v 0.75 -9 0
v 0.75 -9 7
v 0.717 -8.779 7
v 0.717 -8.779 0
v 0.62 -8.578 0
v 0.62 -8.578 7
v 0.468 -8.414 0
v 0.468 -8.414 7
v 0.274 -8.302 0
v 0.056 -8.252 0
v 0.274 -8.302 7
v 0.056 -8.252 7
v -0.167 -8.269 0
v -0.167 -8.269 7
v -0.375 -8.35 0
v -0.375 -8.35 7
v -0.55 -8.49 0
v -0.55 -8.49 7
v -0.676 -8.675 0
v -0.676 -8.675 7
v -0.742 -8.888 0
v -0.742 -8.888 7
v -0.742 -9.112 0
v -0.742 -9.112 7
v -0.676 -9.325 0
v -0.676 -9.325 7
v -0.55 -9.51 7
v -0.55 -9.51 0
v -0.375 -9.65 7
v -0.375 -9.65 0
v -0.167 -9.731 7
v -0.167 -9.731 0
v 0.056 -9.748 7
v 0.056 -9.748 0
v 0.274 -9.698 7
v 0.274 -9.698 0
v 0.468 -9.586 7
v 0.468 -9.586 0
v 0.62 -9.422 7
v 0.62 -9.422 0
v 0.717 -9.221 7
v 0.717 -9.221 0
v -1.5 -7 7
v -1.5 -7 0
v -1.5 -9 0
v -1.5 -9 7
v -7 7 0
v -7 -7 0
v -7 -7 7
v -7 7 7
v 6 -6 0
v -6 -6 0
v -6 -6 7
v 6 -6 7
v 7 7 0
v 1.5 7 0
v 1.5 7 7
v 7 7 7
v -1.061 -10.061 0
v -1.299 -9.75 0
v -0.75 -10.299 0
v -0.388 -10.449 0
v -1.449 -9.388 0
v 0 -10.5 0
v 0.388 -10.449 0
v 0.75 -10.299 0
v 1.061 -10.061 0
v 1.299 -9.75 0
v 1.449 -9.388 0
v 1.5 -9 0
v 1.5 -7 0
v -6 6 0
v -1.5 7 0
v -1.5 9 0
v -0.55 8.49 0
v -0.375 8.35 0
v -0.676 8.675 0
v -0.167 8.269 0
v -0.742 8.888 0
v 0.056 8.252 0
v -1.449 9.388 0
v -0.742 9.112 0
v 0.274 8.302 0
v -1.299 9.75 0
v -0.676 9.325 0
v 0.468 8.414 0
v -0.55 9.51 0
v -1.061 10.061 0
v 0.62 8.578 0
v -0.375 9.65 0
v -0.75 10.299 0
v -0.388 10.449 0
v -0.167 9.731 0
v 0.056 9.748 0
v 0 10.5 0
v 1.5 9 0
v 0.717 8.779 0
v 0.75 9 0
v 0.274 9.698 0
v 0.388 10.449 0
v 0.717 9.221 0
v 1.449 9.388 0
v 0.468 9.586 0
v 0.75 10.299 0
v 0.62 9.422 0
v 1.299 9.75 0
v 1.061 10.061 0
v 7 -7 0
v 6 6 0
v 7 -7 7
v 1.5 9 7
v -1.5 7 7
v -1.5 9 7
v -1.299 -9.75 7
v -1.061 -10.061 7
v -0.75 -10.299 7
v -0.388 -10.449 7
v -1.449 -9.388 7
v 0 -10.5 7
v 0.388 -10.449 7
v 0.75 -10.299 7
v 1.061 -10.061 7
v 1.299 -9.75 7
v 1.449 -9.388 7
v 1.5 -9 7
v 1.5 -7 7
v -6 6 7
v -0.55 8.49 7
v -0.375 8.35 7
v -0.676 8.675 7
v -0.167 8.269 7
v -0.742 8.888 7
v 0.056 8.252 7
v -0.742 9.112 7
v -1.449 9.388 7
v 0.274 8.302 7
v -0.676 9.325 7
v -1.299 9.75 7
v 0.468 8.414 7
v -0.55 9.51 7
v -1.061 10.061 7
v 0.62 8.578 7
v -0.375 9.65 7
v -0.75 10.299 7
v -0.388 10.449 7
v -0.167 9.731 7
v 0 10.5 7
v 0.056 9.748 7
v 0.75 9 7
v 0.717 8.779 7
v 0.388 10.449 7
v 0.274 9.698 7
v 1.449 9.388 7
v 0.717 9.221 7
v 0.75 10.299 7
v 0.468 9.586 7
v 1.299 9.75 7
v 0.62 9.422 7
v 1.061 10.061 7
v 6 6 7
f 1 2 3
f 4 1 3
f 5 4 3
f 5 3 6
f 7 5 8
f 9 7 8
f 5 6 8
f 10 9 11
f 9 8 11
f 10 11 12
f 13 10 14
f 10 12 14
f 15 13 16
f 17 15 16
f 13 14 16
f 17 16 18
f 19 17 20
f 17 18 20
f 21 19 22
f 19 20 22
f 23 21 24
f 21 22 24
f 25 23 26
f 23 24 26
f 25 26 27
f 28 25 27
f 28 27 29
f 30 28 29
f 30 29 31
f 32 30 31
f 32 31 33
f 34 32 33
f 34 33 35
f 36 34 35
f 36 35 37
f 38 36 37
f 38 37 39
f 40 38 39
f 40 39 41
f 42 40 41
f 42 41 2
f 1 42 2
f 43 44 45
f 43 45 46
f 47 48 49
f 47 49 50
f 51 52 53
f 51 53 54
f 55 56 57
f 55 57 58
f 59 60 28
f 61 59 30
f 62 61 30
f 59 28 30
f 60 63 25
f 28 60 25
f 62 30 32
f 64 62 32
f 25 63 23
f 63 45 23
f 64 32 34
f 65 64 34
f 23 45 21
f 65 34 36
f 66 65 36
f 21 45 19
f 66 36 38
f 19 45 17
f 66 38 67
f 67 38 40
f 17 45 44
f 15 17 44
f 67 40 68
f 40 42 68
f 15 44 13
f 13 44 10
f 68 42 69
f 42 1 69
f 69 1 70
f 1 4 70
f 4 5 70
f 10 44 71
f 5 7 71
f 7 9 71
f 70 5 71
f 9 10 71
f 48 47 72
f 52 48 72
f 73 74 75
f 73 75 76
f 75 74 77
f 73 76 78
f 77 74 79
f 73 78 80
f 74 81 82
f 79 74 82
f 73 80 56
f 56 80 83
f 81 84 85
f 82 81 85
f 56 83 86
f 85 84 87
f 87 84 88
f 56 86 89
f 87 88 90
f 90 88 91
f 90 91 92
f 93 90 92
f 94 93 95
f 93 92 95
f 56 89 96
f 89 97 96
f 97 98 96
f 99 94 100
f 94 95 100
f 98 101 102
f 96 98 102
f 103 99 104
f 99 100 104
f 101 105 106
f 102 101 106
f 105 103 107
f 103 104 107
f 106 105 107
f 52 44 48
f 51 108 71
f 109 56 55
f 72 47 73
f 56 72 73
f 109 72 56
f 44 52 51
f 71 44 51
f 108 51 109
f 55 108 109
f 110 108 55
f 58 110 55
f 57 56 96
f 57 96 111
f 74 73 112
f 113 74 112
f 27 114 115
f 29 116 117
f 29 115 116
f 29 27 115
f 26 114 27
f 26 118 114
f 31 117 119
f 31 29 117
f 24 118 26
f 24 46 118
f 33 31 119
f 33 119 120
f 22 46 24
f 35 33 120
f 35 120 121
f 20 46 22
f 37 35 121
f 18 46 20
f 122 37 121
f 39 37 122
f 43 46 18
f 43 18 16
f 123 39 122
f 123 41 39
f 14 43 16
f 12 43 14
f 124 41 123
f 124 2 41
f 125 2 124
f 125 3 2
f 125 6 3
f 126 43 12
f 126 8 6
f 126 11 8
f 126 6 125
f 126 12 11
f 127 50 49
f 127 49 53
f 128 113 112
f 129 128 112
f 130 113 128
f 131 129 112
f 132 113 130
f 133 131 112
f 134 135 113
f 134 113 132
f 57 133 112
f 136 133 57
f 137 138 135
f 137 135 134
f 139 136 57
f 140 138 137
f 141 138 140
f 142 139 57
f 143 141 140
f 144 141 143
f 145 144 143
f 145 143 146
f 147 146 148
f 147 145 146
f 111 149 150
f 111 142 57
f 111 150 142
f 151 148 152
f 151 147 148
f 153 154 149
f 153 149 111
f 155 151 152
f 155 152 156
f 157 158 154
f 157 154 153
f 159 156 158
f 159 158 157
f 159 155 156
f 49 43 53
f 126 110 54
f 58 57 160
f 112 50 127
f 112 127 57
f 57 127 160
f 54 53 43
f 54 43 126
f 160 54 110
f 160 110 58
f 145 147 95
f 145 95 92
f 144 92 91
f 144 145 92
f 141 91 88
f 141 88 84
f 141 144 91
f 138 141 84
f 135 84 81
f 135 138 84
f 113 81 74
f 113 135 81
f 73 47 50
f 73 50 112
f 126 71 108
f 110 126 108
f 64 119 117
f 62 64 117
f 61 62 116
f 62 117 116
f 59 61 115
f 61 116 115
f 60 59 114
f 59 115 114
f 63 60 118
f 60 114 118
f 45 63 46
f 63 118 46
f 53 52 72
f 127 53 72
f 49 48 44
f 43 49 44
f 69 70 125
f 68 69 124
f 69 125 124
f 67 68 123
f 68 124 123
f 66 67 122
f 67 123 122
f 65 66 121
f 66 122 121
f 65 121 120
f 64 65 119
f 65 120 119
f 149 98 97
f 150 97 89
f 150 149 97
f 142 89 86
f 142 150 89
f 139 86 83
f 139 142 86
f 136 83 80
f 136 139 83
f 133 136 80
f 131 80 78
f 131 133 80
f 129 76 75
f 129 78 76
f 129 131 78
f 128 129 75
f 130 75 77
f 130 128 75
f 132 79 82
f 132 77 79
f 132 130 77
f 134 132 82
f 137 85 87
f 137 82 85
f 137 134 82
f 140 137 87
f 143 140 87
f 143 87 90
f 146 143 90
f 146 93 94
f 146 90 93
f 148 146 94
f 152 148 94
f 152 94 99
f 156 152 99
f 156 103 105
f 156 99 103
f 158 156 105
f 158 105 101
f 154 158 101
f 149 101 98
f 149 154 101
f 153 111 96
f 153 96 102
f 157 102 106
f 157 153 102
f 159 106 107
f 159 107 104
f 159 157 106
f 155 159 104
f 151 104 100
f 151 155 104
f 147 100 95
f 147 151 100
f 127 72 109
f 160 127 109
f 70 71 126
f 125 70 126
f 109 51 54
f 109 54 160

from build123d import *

# Parameters (mm, degrees)
SKETCH_1_W          = 14
SKETCH_1_H          = 14
SKETCH_1_W_2        = 12
SKETCH_1_H_2        = 12
EXTRUDE_1_DEPTH     = 7
SKETCH_2_W          = 3
SKETCH_2_H          = 7
EXTRUDE_2_DEPTH     = 3.5
SKETCH_3_R          = 0.75
CUT_EXTRUDE_1_DEPTH = 15.43086969
CUT_EXTRUDE_2_DEPTH = 15.43086969


with BuildPart() as part:
    # 草图1 → 凸台-拉伸1 (new body)
    with BuildSketch(Plane.XY):
        Rectangle(SKETCH_1_W, SKETCH_1_H)
        Rectangle(SKETCH_1_W_2, SKETCH_1_H_2, mode=Mode.SUBTRACT)
    extrude(amount=EXTRUDE_1_DEPTH)

    # 草图2 → 凸台-拉伸2 (add)
    with BuildSketch(Plane.XZ.offset(7)):
        with Locations((0, 3.5)):
            Rectangle(SKETCH_2_W, SKETCH_2_H)
    extrude_2 = extrude(amount=EXTRUDE_2_DEPTH)

    # 草图3 → 切除-拉伸1 (cut, through all)
    with BuildSketch(Plane.XY.offset(7)):
        with Locations((0, -9)):
            Circle(SKETCH_3_R)
    cut_extrude_1 = extrude(amount=-CUT_EXTRUDE_1_DEPTH, mode=Mode.SUBTRACT)

    # 草图3<3> → 切除-拉伸2 (cut, through all)
    with BuildSketch(Plane.XY.offset(7)):
        with BuildLine():
            ThreePointArc((0, -10.5), (-1.060660172, -10.060660172), (-1.5, -9))
            Line((-1.5, -9), (-1.5, -10.5))
            Line((-1.5, -10.5), (0, -10.5))
        make_face()
        with BuildLine():
            Line((1.5, -10.5), (1.5, -9))
            ThreePointArc((1.5, -9), (1.060660172, -10.060660172), (0, -10.5))
            Line((0, -10.5), (1.5, -10.5))
        make_face()
    cut_extrude_2 = extrude(amount=-CUT_EXTRUDE_2_DEPTH, mode=Mode.SUBTRACT)

    # 镜向1: 凸台-拉伸2, 切除-拉伸1, 切除-拉伸2 across plane
    add(extrude_2.mirror(Plane.ZX))
    add(cut_extrude_1.mirror(Plane.ZX), mode=Mode.SUBTRACT)
    add(cut_extrude_2.mirror(Plane.ZX), mode=Mode.SUBTRACT)


solid = part.part
